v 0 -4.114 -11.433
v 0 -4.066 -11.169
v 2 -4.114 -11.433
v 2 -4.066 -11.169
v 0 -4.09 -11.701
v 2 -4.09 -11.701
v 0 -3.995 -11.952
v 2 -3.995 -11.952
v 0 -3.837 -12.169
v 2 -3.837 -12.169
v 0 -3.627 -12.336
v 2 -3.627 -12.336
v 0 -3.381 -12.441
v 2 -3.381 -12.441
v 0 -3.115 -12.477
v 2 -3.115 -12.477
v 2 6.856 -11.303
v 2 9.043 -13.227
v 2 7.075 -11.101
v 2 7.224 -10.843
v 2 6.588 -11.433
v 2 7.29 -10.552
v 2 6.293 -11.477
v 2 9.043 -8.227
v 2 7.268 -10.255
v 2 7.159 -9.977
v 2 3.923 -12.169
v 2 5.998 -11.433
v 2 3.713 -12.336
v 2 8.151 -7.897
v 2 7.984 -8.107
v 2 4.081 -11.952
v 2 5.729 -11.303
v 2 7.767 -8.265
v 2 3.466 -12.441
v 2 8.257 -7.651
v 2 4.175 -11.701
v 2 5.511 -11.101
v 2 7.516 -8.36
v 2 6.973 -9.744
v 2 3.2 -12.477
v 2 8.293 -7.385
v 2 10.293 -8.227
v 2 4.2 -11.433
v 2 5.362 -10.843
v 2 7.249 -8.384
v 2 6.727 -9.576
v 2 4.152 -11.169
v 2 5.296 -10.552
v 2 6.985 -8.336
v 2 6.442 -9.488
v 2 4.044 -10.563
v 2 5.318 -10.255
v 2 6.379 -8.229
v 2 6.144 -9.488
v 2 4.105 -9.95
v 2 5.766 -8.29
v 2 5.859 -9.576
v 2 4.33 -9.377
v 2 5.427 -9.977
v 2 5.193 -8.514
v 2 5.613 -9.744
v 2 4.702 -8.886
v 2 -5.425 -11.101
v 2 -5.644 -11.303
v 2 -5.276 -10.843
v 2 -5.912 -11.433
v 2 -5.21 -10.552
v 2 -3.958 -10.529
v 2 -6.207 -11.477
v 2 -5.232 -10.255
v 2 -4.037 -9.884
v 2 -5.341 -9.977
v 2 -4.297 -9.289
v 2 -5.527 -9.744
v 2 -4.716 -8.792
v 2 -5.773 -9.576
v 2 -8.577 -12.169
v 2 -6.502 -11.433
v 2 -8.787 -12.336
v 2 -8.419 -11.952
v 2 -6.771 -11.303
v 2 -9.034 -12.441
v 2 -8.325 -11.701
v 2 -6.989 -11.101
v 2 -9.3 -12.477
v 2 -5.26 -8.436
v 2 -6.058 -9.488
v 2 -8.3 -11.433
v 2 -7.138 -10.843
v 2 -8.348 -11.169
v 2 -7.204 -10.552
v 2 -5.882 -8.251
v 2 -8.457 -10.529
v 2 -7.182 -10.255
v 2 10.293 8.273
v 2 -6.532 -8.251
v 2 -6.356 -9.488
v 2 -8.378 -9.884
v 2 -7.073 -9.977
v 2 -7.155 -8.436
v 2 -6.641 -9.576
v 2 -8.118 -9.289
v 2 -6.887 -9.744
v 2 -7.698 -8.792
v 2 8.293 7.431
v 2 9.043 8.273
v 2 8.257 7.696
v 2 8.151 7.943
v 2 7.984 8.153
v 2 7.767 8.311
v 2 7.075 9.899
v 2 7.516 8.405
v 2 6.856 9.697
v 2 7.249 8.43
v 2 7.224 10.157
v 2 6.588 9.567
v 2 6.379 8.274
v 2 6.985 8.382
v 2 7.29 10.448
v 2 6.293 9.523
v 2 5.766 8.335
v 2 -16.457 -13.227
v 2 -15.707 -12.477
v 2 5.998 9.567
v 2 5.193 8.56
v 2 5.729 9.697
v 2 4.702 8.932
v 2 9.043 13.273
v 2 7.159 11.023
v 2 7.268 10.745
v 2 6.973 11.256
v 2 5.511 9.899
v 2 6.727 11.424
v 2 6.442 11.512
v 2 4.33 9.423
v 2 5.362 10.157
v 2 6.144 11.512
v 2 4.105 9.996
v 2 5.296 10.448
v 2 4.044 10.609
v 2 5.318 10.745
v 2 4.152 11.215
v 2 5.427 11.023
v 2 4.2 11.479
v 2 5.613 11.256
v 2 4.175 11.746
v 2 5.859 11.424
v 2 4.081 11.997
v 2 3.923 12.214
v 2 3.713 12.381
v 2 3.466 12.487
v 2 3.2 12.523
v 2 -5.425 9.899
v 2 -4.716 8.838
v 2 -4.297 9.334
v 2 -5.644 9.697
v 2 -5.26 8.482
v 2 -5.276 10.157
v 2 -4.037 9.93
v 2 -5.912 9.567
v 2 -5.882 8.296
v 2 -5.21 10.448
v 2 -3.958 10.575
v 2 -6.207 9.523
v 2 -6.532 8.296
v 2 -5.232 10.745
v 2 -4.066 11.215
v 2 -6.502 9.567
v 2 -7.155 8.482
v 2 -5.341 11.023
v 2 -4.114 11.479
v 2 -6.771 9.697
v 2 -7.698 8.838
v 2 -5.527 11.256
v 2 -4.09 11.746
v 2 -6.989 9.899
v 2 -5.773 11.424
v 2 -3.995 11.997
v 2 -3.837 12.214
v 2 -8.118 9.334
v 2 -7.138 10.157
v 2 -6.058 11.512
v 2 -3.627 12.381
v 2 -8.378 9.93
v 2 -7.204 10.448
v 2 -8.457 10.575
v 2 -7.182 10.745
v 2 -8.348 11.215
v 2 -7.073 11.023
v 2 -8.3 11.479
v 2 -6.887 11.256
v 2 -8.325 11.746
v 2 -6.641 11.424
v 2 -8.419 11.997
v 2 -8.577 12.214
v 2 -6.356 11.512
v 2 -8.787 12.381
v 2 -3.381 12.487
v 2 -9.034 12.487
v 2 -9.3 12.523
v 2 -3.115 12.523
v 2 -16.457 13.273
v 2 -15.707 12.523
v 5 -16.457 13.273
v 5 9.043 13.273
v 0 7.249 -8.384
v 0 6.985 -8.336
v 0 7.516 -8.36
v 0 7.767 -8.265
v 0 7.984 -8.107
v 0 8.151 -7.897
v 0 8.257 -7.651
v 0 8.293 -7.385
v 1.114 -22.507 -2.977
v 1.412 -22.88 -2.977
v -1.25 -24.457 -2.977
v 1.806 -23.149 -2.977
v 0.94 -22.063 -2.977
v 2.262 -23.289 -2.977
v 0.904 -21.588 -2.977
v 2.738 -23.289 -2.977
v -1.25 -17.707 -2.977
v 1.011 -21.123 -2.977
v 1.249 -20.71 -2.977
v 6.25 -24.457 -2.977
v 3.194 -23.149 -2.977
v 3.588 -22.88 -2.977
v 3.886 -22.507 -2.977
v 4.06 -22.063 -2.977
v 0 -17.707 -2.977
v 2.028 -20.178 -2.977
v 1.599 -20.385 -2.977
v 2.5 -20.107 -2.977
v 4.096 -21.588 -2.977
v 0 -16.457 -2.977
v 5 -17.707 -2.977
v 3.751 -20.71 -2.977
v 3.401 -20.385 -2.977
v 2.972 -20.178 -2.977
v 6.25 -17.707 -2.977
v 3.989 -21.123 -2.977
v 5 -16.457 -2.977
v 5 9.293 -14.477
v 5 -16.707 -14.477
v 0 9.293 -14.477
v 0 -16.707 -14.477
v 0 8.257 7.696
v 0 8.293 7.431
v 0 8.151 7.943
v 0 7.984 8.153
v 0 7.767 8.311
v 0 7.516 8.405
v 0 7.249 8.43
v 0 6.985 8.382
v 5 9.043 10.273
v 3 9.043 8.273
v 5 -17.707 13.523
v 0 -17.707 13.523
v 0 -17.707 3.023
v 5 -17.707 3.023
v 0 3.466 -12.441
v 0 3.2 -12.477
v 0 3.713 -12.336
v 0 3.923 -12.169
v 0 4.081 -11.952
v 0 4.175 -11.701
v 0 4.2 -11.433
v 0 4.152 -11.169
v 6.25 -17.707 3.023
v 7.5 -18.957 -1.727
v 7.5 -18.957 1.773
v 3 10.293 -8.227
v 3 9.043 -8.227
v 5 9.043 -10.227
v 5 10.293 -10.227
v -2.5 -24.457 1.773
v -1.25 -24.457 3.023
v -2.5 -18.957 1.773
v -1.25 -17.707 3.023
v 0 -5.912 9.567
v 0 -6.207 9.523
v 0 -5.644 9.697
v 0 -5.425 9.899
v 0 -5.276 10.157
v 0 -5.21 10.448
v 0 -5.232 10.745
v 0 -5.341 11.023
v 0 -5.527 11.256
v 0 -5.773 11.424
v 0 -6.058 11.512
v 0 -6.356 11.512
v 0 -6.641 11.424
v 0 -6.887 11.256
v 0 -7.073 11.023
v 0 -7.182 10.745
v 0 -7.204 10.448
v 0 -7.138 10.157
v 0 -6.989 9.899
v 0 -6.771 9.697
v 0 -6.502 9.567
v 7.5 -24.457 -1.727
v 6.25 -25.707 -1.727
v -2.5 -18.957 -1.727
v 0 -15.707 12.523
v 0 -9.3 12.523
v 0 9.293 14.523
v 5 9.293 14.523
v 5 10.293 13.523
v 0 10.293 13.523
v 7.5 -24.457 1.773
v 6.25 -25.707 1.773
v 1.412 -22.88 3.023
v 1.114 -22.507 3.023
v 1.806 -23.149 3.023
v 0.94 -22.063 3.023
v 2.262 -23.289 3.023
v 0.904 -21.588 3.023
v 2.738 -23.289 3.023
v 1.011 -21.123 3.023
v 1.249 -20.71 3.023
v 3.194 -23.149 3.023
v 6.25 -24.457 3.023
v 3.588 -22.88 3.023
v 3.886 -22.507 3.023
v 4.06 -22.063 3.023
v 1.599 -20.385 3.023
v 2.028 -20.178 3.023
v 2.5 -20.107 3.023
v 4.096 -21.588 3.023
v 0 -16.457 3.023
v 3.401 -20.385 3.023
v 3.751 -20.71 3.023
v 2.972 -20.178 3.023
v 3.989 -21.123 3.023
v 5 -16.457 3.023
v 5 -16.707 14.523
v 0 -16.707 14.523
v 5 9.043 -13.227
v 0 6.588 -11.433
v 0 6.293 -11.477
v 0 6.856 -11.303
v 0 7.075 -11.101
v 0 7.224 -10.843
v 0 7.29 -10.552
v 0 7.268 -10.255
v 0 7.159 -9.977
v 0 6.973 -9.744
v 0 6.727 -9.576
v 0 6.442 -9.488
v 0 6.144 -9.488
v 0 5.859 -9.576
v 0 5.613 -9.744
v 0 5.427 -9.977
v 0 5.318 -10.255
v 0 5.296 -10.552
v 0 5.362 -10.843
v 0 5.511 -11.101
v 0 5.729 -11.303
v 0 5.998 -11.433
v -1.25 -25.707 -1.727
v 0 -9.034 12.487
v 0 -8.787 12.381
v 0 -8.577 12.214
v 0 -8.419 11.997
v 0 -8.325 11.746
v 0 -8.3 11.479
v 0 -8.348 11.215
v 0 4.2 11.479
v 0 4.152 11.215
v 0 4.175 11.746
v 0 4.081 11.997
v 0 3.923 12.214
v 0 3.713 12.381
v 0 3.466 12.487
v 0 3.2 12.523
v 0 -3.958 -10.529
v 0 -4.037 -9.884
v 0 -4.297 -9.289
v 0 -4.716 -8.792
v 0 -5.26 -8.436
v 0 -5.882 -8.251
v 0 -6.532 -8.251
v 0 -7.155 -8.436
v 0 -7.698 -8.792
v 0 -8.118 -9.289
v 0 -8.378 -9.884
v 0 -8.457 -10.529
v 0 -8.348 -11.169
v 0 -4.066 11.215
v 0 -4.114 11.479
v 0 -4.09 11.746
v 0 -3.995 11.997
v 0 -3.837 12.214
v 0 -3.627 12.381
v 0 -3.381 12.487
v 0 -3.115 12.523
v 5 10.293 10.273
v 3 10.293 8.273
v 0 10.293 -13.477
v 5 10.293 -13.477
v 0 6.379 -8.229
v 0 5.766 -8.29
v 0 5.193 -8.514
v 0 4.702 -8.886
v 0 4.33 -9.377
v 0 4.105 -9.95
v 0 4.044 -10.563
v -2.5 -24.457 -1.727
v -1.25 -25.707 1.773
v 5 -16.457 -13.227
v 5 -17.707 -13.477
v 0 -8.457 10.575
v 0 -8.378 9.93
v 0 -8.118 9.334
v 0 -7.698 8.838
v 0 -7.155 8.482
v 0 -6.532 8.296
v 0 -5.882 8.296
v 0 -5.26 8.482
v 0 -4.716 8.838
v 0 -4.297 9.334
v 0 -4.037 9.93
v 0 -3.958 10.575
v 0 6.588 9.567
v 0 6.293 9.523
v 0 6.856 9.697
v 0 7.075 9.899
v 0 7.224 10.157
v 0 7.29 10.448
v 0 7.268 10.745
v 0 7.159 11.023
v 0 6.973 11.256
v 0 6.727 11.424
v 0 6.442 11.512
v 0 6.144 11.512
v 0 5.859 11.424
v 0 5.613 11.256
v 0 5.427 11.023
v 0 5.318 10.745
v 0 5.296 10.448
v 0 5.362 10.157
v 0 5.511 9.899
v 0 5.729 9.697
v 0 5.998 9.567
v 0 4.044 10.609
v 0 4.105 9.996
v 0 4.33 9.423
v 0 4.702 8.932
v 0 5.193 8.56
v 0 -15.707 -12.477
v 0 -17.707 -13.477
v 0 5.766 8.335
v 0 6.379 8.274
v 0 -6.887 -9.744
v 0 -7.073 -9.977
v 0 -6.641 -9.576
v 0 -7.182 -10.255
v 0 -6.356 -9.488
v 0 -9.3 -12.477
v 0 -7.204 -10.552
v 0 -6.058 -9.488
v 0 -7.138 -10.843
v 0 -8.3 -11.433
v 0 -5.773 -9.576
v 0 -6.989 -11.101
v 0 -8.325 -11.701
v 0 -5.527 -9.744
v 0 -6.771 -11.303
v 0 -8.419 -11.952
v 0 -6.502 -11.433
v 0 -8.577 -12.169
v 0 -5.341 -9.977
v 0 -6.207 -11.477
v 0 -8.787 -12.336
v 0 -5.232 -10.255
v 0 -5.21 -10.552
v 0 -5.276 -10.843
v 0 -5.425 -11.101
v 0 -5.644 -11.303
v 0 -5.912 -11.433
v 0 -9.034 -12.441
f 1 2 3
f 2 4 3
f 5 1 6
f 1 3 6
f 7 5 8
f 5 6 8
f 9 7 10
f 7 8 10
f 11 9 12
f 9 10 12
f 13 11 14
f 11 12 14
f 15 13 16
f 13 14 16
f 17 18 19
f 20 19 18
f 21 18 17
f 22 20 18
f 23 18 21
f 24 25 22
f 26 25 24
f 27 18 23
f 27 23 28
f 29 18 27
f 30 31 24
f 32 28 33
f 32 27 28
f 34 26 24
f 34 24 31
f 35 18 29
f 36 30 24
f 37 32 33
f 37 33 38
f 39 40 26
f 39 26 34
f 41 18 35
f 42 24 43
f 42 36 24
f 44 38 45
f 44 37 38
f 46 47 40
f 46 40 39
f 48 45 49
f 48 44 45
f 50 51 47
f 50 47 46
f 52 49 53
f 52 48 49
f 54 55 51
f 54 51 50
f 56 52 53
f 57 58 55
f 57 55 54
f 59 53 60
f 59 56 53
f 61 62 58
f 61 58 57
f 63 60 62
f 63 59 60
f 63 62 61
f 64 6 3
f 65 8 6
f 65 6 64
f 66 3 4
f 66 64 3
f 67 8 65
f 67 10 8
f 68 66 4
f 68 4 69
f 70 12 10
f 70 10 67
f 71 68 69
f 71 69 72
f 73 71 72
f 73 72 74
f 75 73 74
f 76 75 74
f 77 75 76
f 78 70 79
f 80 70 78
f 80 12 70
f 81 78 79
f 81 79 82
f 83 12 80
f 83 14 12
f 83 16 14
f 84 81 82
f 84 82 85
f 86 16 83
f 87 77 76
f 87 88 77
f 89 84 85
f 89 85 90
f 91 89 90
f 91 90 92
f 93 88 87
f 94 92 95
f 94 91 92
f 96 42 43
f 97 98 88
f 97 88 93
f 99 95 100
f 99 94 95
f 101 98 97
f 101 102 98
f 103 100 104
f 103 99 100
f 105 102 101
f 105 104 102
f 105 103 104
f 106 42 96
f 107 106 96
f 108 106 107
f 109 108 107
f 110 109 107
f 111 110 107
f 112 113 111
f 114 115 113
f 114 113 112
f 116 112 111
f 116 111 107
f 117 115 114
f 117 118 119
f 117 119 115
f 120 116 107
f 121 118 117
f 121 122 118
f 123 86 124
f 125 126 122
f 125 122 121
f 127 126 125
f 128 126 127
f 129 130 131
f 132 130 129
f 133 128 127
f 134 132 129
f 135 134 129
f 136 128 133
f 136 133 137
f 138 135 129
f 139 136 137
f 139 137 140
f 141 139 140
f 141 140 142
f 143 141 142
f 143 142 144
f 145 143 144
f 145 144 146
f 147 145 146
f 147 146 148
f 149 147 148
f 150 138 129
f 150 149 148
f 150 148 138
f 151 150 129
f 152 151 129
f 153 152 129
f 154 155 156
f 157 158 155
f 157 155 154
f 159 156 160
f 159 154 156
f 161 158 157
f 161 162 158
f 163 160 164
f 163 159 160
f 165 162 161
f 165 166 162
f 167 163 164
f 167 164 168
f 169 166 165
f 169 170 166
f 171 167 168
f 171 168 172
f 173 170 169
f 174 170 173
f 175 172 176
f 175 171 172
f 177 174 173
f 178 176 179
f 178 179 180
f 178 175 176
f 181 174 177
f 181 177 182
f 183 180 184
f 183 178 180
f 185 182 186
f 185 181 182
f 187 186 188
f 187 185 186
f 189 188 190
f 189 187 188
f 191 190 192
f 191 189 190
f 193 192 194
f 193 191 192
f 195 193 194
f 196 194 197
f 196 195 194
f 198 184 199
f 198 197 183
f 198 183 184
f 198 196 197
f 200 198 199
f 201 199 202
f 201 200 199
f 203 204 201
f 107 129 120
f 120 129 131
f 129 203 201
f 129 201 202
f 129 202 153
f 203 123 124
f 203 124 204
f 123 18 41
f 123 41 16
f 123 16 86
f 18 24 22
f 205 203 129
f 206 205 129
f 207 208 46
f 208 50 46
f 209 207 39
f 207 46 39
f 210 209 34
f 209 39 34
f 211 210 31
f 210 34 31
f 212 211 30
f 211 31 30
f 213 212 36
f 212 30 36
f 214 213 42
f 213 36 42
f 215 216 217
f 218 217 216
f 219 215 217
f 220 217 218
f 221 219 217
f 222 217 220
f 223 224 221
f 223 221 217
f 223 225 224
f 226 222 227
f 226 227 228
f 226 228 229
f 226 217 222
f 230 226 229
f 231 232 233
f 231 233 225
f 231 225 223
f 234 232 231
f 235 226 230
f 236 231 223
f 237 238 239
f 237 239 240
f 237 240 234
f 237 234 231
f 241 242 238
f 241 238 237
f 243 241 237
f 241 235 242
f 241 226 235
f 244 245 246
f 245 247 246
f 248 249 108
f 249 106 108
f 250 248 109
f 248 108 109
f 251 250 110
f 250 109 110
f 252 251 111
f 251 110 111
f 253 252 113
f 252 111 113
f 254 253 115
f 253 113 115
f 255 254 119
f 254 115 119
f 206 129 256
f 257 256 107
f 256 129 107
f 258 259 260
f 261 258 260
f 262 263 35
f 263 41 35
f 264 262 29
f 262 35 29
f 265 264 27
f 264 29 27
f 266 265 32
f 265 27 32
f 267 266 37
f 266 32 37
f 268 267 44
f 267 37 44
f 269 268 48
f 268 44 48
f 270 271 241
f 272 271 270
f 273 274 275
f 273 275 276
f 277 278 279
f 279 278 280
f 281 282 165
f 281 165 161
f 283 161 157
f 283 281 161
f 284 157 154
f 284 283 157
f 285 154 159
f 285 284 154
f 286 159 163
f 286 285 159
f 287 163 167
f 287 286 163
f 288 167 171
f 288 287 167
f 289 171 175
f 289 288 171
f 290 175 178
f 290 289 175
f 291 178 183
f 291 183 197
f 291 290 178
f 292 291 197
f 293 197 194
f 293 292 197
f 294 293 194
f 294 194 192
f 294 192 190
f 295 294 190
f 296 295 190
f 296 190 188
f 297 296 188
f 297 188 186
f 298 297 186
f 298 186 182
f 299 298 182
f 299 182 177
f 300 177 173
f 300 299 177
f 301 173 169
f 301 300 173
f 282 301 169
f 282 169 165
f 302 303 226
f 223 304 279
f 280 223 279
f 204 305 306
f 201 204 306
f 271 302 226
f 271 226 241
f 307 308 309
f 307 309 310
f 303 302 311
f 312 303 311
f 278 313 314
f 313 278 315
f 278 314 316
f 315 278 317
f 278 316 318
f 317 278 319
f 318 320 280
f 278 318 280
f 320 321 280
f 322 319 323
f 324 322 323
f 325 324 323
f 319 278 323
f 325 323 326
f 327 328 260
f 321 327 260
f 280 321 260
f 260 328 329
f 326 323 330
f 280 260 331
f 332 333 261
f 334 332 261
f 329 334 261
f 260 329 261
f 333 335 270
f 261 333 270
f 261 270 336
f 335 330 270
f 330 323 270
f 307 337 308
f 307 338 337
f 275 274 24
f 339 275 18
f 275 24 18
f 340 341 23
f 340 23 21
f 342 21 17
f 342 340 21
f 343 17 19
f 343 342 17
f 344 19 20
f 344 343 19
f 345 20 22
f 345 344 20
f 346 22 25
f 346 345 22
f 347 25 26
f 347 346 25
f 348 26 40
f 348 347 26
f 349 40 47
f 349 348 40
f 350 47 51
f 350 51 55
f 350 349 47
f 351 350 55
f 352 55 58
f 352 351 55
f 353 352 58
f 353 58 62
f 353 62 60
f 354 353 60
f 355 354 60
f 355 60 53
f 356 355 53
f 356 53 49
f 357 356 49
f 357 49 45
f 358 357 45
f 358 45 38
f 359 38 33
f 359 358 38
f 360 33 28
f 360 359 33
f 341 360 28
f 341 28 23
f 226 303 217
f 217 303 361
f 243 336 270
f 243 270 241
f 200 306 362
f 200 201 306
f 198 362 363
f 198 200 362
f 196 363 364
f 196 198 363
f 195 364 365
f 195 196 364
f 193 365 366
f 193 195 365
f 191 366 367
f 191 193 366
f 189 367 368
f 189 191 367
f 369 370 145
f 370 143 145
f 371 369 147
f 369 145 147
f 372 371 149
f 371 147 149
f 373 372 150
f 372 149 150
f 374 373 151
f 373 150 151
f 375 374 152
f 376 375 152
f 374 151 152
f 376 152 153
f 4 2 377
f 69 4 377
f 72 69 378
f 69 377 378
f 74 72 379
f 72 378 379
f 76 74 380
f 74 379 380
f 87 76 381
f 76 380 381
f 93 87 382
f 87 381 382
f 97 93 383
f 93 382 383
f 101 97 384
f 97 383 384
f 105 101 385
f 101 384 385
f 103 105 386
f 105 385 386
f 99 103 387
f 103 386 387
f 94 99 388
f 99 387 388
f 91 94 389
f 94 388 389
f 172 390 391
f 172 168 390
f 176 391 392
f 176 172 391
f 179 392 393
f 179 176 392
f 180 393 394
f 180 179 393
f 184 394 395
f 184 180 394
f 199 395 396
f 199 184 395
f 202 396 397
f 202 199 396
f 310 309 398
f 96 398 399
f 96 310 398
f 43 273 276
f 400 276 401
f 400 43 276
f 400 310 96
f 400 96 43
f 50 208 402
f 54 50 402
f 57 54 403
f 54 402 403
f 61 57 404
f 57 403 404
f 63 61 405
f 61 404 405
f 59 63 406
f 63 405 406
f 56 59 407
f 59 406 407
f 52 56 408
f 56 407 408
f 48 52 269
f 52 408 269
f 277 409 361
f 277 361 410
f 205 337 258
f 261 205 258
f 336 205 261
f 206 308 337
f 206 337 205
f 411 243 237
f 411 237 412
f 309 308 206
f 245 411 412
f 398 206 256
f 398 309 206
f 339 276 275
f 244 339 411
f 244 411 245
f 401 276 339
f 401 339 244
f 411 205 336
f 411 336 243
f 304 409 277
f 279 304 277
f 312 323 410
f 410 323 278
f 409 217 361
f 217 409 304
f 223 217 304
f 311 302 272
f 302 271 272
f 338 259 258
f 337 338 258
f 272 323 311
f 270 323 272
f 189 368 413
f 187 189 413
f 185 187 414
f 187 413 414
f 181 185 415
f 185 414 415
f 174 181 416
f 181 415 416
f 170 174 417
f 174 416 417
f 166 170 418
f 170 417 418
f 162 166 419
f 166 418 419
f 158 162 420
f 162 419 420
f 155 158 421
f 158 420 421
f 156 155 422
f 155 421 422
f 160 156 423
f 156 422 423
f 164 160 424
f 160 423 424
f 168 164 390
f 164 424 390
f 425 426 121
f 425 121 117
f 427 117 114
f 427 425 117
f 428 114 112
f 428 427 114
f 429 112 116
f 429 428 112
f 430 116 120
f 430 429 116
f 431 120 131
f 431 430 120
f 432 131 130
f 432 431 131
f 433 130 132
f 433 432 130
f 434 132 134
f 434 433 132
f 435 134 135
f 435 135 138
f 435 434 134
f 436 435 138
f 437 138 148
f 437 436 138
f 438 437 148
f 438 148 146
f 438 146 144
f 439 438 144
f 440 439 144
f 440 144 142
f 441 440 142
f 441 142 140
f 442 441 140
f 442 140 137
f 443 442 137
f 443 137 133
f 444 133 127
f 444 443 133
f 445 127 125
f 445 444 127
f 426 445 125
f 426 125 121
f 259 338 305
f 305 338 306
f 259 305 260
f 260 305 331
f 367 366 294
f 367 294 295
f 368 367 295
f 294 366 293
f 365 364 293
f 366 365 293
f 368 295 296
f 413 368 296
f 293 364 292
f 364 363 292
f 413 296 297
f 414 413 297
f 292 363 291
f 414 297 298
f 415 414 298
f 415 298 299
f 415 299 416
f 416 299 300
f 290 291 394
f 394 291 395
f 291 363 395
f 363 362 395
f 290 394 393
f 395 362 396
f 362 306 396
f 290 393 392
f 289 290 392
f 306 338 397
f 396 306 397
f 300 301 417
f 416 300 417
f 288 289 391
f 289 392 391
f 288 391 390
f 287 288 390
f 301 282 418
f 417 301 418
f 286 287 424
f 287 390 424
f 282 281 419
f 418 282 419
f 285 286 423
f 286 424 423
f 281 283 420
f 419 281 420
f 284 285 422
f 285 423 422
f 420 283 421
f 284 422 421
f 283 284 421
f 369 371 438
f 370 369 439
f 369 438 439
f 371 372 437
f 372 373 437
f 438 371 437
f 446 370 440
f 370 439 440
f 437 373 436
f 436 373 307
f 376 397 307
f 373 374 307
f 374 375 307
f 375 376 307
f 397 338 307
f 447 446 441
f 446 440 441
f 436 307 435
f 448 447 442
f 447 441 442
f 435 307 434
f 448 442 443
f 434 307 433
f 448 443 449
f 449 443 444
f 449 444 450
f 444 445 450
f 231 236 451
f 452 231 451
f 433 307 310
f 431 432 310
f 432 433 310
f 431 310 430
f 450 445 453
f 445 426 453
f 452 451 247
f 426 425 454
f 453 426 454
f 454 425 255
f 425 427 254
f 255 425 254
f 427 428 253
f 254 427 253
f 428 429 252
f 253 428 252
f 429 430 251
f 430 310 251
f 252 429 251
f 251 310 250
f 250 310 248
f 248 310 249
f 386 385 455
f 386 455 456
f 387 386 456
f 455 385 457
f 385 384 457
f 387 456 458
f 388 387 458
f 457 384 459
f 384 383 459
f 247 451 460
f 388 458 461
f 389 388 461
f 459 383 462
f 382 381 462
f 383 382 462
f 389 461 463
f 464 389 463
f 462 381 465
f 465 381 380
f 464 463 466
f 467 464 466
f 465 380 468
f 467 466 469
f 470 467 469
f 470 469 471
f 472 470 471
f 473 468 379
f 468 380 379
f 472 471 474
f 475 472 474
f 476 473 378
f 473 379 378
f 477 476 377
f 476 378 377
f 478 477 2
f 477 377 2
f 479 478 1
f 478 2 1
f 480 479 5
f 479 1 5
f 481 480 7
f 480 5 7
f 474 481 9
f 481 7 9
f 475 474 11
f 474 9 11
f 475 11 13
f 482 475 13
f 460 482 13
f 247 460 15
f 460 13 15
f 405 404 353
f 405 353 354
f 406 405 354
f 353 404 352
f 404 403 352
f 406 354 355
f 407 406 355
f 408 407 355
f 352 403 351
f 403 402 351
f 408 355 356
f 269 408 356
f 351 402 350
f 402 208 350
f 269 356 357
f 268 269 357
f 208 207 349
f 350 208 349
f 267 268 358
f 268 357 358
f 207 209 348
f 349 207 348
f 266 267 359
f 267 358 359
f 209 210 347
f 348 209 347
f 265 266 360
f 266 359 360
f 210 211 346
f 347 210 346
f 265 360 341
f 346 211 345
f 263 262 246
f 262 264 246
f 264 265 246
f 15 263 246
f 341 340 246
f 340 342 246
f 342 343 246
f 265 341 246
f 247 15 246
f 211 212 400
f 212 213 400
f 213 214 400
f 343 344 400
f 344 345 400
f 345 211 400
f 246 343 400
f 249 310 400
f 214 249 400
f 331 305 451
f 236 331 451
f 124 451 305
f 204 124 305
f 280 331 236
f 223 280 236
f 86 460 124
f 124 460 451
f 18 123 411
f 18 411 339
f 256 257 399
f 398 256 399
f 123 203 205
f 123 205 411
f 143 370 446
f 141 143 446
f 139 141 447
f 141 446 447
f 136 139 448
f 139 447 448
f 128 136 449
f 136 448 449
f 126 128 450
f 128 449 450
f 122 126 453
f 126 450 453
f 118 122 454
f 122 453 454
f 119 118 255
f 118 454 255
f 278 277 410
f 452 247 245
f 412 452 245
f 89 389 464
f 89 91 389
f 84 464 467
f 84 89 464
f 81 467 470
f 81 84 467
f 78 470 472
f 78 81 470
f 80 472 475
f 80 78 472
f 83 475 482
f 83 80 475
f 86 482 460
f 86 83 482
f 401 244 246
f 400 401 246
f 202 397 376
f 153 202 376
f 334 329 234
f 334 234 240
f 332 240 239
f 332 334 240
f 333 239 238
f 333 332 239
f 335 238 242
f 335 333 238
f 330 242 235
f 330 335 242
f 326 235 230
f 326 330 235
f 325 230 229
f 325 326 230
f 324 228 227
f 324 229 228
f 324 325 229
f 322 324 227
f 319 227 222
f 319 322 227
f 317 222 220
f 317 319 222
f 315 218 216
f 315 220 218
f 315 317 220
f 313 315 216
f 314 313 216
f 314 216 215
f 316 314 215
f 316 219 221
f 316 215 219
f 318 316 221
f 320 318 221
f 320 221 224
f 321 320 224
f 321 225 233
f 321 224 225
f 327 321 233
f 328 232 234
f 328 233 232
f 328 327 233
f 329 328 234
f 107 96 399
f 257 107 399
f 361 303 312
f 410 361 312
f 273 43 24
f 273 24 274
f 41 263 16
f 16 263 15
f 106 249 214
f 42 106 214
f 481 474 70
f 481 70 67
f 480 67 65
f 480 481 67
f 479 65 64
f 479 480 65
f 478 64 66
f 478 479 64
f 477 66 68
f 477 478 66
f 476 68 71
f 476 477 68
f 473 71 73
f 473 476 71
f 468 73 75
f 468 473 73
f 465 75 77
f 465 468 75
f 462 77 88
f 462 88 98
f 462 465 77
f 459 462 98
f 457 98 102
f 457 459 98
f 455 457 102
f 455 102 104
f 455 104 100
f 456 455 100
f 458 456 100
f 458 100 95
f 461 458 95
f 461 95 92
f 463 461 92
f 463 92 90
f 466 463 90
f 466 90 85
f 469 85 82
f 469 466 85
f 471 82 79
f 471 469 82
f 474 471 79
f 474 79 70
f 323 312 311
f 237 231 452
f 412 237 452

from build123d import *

# Parameters (mm, degrees)
SKETCH1_W                = 29
SKETCH1_H                = 28
SKETCH1_R                = 1
BOSS_EXTRUDE1_DEPTH      = 2
SKETCH2_W                = 29
SKETCH2_H                = 28
SKETCH2_W_2              = 26.5
SKETCH2_H_2              = 25.5
BOSS_EXTRUDE2_DEPTH      = 3
FILLET1_R                = 1
BOSS_EXTRUDE3_DEPTH      = 2.5
BOSS_EXTRUDE3_DEPTH_BACK = 7.5
SKETCH3_W                = 6
SKETCH3_H                = 8
CHAMFER1_SIZE            = 1.25
CUT_EXTRUDE1_DEPTH       = 32.990000884
CUT_EXTRUDE1_DEPTH_BACK  = 32.990000884
SKETCH5_R                = 1.6
SKETCH7_W                = 3
SKETCH7_H                = 16.5
CUT_EXTRUDE2_DEPTH       = 39.40215359
CHAMFER2_SIZE            = 2
CHAMFER3_SIZE            = 1


with BuildPart() as part:
    # Sketch1 → Boss-Extrude1 (new body)
    with BuildSketch(Plane(origin=(0, 0, 0), x_dir=(0, 0, -1), z_dir=(1, 0, 0))):
        with Locations((-0.022840642, -3.707200481)):
            Rectangle(SKETCH1_W, SKETCH1_H)
        with BuildLine():
            ThreePointArc((-12.522840642, 5.262023113), (-8.931850385, 4.701809261), (-9.492064236, 8.292799519))
            Line((-9.492064236, 8.292799519), (9.446382951, 8.292799519))
            ThreePointArc((9.446382951, 8.292799519), (8.8861691, 4.701809261), (12.477159358, 5.262023113))
            Line((12.477159358, 5.262023113), (12.477159358, -5.176424074))
            ThreePointArc((12.477159358, -5.176424074), (8.227159358, -6.207200481), (12.477159358, -7.237976887))
            Line((12.477159358, -7.237976887), (12.477159358, -15.707200481))
            Line((12.477159358, -15.707200481), (-12.522840642, -15.707200481))
            Line((-12.522840642, -15.707200481), (-12.522840642, -7.237976887))
            ThreePointArc((-12.522840642, -7.237976887), (-8.272840642, -6.207200481), (-12.522840642, -5.176424074))
            Line((-12.522840642, -5.176424074), (-12.522840642, 5.262023113))
        make_face(mode=Mode.SUBTRACT)
        with Locations((-10.522840642, 6.292799519)):
            Circle(SKETCH1_R, mode=Mode.SUBTRACT)
        with Locations((-10.522840642, -6.207200481)):
            Circle(SKETCH1_R, mode=Mode.SUBTRACT)
        with Locations((10.477159358, -6.207200481)):
            Circle(SKETCH1_R, mode=Mode.SUBTRACT)
        with Locations((10.477159358, 6.292799519)):
            Circle(SKETCH1_R, mode=Mode.SUBTRACT)
    extrude(amount=BOSS_EXTRUDE1_DEPTH)

    # Sketch2 → Boss-Extrude2 (add)
    with BuildSketch(Plane(origin=(2, 0, 0), x_dir=(0, 0, -1), z_dir=(1, 0, 0))):
        with Locations((-0.022840642, -3.707200481)):
            Rectangle(SKETCH2_W, SKETCH2_H)
        with Locations((-0.022840642, -3.707200481)):
            Rectangle(SKETCH2_W_2, SKETCH2_H_2, mode=Mode.SUBTRACT)
    extrude(amount=BOSS_EXTRUDE2_DEPTH)

    # Fillet1
    fillet1_edges = [part.edges().sort_by_distance(p)[0] for p in [
        (1, 5.262023113, 12.522840642),
        (1, -5.176424074, 12.522840642),
        (1, -7.237976887, 12.522840642),
        (1, -7.237976887, -12.477159358),
        (1, -5.176424074, -12.477159358),
        (1, 5.262023113, -12.477159358),
        (1, 8.292799519, -9.446382951),
        (1, 8.292799519, 9.492064236),
    ]]
    fillet(fillet1_edges, radius=FILLET1_R)

    # Sketch3 → Boss-Extrude3 (add, two sides: drawn at the far end of the back side and taken through both)
    with BuildSketch(Plane.ZY.offset(-BOSS_EXTRUDE3_DEPTH_BACK)):
        with Locations((0.022840642, -21.707200481)):
            Rectangle(SKETCH3_W, SKETCH3_H)
    extrude(amount=BOSS_EXTRUDE3_DEPTH + BOSS_EXTRUDE3_DEPTH_BACK)

    # Chamfer1
    chamfer1_edges = [part.edges().sort_by_distance(p)[0] for p in [
        (2.5, -25.707200481, -2.977159358),
        (-2.5, -17.707200481, 0.022840642),
        (-2.5, -21.707200481, 3.022840642),
        (-2.5, -21.707200481, -2.977159358),
        (-2.5, -25.707200481, 0.022840642),
        (2.5, -25.707200481, 3.022840642),
        (7.5, -25.707200481, 0.022840642),
        (7.5, -21.707200481, 3.022840642),
        (7.5, -17.707200481, 0.022840642),
        (7.5, -21.707200481, -2.977159358),
        (5, -17.707200481, 0.022840642),
        (0, -17.707200481, 0.022840642),
    ]]
    chamfer(chamfer1_edges, length=CHAMFER1_SIZE - 0.0001)  # a hair under: the kernel refuses the full size

    # Sketch5 → Cut-Extrude1 (cut, two sides: drawn at the far end of the back side and taken through both)
    with BuildSketch(Plane(origin=(0, 0, -2.977159358), x_dir=(-1, 0, 0), z_dir=(0, 0, -1)).offset(-CUT_EXTRUDE1_DEPTH_BACK)):
        with Locations(Location((-2.5, -21.707200481, 0), (0, 0, 90))):
            Circle(SKETCH5_R)
    extrude(amount=CUT_EXTRUDE1_DEPTH + CUT_EXTRUDE1_DEPTH_BACK, mode=Mode.SUBTRACT)

    # Sketch7 → Cut-Extrude2 (cut, through all)
    with BuildSketch(Plane.XZ.offset(-9.042799519)):
        with Locations((3.5, 0.022840642)):
            Rectangle(SKETCH7_W, SKETCH7_H)
    extrude(amount=-CUT_EXTRUDE2_DEPTH, mode=Mode.SUBTRACT)

    # Chamfer2
    chamfer2_edges = [part.edges().sort_by_distance(p)[0] for p in [
        (5, 9.667799519, 8.272840642),
        (5, 9.667799519, -8.227159358),
    ]]
    chamfer(chamfer2_edges, length=CHAMFER2_SIZE)

    # Chamfer3
    chamfer3_edges = [part.edges().sort_by_distance(p)[0] for p in [
        (2.5, 10.292799519, -14.477159358),
        (2.5, -17.707200481, -14.477159358),
        (2.5, -17.707200481, 14.522840642),
        (2.5, 10.292799519, 14.522840642),
    ]]
    chamfer(chamfer3_edges, length=CHAMFER3_SIZE)


solid = part.part
